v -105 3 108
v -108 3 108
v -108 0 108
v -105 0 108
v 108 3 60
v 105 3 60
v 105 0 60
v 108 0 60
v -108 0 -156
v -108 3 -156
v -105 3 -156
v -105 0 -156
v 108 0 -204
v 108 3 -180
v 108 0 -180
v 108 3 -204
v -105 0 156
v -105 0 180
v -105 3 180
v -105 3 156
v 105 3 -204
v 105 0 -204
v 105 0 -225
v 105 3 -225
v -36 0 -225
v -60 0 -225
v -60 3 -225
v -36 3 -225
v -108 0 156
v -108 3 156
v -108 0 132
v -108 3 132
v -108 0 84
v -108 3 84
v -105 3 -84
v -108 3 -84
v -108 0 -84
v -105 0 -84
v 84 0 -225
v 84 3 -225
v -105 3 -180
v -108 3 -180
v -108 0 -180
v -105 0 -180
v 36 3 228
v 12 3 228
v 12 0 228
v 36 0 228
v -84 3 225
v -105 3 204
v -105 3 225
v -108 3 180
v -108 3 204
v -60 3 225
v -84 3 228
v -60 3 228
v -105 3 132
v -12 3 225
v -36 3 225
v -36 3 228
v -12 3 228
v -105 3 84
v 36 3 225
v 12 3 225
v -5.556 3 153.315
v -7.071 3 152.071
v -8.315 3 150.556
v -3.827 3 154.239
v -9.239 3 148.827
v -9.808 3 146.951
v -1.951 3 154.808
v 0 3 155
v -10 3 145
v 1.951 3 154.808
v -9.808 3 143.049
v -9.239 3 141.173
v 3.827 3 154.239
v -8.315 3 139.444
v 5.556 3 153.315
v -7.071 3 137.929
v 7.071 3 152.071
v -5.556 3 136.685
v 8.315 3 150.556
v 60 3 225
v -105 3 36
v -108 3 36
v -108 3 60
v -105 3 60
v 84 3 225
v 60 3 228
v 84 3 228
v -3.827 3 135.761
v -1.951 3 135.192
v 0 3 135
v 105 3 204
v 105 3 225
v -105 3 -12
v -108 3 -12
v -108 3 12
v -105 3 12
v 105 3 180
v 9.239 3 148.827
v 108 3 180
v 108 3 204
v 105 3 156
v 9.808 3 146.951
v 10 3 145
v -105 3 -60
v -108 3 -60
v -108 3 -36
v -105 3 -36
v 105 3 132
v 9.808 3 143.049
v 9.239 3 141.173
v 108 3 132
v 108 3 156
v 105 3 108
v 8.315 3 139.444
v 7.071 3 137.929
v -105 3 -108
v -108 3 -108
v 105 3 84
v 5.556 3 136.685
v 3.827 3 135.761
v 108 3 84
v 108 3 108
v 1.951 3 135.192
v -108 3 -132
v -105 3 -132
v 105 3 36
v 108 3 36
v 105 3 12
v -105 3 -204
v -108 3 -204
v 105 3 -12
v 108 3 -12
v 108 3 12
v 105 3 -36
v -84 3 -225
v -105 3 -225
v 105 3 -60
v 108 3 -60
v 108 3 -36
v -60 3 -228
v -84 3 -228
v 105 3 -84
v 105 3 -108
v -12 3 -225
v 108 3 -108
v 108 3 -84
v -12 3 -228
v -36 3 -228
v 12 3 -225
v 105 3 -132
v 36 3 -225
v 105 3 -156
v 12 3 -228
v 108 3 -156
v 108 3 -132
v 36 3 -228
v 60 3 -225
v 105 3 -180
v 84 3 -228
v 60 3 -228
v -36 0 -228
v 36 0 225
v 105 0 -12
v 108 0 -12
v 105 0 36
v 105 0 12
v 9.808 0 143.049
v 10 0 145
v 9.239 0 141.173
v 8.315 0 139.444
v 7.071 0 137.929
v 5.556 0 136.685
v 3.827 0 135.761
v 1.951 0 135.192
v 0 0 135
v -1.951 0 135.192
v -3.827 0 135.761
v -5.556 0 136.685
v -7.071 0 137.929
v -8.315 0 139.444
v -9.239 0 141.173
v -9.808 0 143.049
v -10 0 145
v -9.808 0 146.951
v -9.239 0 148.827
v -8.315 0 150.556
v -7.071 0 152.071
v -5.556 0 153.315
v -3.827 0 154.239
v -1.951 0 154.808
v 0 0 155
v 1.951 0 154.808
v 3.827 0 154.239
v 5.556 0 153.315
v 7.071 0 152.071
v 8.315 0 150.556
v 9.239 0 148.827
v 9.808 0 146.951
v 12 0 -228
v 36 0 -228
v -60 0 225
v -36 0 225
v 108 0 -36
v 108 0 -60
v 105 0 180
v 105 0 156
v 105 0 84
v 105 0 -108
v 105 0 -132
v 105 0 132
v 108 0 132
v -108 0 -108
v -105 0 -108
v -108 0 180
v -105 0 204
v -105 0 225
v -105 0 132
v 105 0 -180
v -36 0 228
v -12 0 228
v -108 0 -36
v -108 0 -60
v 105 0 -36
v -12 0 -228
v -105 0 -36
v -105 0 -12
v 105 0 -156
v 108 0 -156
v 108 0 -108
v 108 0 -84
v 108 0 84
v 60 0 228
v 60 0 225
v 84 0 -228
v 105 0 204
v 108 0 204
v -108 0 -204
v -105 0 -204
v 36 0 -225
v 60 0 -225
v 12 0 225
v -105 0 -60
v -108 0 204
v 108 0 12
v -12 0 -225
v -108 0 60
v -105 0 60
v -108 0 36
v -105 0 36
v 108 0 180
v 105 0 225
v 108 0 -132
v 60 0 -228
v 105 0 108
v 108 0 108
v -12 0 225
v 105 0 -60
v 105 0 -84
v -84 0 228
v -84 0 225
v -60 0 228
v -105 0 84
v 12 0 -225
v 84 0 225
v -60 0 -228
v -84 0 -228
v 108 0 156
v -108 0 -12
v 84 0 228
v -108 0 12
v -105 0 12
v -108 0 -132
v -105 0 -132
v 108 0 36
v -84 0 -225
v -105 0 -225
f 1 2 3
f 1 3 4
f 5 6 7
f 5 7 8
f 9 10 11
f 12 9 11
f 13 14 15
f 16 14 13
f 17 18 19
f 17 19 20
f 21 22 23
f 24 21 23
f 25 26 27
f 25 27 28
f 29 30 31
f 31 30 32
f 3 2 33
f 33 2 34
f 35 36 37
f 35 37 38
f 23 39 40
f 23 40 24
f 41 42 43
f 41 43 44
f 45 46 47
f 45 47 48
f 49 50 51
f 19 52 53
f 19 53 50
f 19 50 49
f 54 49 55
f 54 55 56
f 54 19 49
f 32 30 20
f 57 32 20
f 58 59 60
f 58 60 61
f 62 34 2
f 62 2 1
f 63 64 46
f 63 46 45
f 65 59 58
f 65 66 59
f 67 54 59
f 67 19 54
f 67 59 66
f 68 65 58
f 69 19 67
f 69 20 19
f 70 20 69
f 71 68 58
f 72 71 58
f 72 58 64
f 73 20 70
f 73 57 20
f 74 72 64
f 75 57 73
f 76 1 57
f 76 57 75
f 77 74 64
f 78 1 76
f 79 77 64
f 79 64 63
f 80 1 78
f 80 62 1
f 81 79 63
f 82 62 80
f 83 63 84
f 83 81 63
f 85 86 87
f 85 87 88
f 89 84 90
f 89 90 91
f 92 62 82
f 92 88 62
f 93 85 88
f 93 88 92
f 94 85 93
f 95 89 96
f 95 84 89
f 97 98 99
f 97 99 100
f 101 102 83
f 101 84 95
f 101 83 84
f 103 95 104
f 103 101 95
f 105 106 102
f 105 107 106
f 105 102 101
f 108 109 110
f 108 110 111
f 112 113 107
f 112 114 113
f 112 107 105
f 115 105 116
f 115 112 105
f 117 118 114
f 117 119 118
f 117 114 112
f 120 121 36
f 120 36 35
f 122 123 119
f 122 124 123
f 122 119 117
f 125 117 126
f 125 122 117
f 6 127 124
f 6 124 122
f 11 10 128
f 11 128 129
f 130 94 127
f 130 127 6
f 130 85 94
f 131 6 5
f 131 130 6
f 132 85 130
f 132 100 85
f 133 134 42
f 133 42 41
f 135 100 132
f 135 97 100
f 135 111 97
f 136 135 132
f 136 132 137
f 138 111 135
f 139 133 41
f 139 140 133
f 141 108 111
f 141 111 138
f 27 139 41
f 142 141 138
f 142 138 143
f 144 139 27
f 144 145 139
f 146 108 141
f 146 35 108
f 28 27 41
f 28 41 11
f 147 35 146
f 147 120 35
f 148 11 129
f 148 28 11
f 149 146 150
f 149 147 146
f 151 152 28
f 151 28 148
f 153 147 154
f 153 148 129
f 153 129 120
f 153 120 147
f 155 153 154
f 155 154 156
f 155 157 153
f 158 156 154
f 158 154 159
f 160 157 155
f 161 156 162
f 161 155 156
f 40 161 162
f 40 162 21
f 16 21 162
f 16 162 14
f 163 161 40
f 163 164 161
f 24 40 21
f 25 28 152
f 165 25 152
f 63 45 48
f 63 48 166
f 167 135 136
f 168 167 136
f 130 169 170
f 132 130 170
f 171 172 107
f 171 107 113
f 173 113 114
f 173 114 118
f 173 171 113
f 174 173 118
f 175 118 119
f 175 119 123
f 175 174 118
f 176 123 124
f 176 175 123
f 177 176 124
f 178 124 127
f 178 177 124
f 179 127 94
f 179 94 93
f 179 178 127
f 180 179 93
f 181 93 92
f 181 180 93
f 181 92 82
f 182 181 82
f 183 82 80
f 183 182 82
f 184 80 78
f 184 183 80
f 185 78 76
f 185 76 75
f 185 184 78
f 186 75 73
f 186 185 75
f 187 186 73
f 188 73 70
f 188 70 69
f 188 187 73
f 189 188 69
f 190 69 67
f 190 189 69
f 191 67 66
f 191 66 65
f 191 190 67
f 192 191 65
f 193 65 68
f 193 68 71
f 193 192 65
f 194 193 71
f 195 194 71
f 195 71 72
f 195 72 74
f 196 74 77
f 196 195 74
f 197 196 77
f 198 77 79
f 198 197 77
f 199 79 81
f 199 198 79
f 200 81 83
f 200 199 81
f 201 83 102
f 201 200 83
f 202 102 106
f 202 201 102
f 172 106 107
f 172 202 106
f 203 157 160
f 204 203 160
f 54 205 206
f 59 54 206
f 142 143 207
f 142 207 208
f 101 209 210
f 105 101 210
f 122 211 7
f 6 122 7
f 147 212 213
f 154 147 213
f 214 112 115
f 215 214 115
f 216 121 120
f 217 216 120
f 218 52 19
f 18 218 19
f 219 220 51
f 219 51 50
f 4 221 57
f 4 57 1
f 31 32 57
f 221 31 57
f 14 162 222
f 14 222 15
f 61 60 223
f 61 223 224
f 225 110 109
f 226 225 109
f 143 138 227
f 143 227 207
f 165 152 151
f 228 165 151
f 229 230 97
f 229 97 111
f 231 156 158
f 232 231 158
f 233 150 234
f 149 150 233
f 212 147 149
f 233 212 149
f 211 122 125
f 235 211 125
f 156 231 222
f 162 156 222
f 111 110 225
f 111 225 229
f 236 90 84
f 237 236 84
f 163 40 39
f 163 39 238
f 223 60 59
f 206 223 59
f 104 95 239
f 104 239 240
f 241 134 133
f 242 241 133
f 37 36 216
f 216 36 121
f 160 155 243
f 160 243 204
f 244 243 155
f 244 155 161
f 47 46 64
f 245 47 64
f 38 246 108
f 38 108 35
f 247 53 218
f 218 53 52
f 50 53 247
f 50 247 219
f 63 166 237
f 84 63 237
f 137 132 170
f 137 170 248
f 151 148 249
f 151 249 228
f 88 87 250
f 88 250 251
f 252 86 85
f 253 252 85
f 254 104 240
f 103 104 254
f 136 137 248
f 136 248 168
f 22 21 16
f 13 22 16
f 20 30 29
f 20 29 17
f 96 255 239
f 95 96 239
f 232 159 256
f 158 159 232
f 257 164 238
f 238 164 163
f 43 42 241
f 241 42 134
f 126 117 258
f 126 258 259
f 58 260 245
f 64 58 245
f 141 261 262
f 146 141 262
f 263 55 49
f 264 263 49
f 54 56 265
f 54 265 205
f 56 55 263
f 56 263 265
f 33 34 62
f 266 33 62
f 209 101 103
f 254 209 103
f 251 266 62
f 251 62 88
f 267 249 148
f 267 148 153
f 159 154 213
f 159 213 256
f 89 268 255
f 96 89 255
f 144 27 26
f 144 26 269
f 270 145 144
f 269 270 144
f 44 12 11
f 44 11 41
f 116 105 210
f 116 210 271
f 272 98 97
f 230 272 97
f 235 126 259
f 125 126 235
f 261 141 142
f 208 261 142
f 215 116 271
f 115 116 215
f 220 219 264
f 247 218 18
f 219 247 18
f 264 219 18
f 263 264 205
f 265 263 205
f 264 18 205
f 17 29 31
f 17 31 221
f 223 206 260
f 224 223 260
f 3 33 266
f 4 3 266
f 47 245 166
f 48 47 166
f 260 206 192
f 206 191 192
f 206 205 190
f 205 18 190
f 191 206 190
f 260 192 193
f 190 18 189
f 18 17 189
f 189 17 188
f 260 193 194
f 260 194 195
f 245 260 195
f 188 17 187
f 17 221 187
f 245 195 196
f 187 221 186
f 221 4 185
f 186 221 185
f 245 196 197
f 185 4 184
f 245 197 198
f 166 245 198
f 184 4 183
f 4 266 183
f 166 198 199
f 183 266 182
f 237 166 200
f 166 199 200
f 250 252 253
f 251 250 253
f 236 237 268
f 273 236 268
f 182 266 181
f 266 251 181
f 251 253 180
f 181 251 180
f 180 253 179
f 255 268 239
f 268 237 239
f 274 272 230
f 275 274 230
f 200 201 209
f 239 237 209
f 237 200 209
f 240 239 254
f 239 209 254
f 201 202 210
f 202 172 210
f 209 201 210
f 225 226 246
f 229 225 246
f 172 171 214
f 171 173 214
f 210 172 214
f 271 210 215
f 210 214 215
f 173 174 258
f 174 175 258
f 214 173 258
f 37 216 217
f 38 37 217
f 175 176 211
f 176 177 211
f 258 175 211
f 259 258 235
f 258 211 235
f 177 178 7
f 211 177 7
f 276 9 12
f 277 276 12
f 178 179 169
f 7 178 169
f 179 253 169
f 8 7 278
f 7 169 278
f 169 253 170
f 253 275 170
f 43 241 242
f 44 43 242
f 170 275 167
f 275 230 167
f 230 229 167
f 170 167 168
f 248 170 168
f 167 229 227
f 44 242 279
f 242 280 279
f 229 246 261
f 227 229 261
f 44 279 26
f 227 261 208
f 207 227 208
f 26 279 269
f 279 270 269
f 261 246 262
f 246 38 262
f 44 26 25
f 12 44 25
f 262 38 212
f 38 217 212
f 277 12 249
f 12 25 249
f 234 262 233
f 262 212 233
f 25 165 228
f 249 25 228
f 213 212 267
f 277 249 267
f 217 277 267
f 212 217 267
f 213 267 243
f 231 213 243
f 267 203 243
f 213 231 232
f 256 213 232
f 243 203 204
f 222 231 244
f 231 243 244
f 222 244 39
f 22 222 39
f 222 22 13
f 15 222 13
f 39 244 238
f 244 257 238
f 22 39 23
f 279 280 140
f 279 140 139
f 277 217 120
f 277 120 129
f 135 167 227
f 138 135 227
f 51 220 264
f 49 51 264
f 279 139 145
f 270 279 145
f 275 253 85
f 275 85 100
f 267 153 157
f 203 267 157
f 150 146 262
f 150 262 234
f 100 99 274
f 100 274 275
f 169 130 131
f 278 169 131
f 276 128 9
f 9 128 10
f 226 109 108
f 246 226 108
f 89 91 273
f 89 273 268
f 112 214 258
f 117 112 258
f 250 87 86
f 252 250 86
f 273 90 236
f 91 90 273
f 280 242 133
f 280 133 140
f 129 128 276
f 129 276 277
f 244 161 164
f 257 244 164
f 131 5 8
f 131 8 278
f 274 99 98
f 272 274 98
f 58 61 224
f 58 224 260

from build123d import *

# Parameters (mm, degrees)
SKETCH1_W           = 210
SKETCH1_H           = 450
SKETCH1_R           = 10
BOSS_EXTRUDE1_DEPTH = 3
SKETCH3_W           = 3
SKETCH3_H           = 24
BOSS_EXTRUDE3_DEPTH = 3
SKETCH2_W           = 24
SKETCH2_H           = 3
BOSS_EXTRUDE4_DEPTH = 3


with BuildPart() as part:
    # Sketch1 → Boss-Extrude1 (new body)
    with BuildSketch(Plane(origin=(0, 0, 0), x_dir=(1, 0, 0), z_dir=(0, 1, 0))):
        Rectangle(SKETCH1_W, SKETCH1_H)
        with Locations((0, -145)):
            Circle(SKETCH1_R, mode=Mode.SUBTRACT)
    extrude(amount=BOSS_EXTRUDE1_DEPTH)

    # Sketch3 → Boss-Extrude3 (add)
    with BuildSketch(Plane(origin=(0, 3, 0), x_dir=(1, 0, 0), z_dir=(0, 1, 0))):
        with Locations((-106.5, 192)):
            Rectangle(SKETCH3_W, SKETCH3_H)
        with Locations((106.5, 192)):
            Rectangle(SKETCH3_W, SKETCH3_H)
        with Locations((106.5, 144)):
            Rectangle(SKETCH3_W, SKETCH3_H)
        with Locations((106.5, 96)):
            Rectangle(SKETCH3_W, SKETCH3_H)
        with Locations((106.5, 48)):
            Rectangle(SKETCH3_W, SKETCH3_H)
        with Locations((106.5, 0)):
            Rectangle(SKETCH3_W, SKETCH3_H)
        with Locations((106.5, -48)):
            Rectangle(SKETCH3_W, SKETCH3_H)
        with Locations((106.5, -96)):
            Rectangle(SKETCH3_W, SKETCH3_H)
        with Locations((106.5, -144)):
            Rectangle(SKETCH3_W, SKETCH3_H)
        with Locations((106.5, -192)):
            Rectangle(SKETCH3_W, SKETCH3_H)
        with Locations((-106.5, 144)):
            Rectangle(SKETCH3_W, SKETCH3_H)
        with Locations((-106.5, 96)):
            Rectangle(SKETCH3_W, SKETCH3_H)
        with Locations((-106.5, 48)):
            Rectangle(SKETCH3_W, SKETCH3_H)
        with Locations((-106.5, 0)):
            Rectangle(SKETCH3_W, SKETCH3_H)
        with Locations((-106.5, -48)):
            Rectangle(SKETCH3_W, SKETCH3_H)
        with Locations((-106.5, -96)):
            Rectangle(SKETCH3_W, SKETCH3_H)
        with Locations((-106.5, -144)):
            Rectangle(SKETCH3_W, SKETCH3_H)
        with Locations((-106.5, -192)):
            Rectangle(SKETCH3_W, SKETCH3_H)
    extrude(amount=-BOSS_EXTRUDE3_DEPTH)

    # Sketch2 → Boss-Extrude4 (add)
    with BuildSketch(Plane(origin=(0, 3, 0), x_dir=(1, 0, 0), z_dir=(0, 1, 0))):
        with Locations((-72, 226.5)):
            Rectangle(SKETCH2_W, SKETCH2_H)
        with Locations((-24, 226.5)):
            Rectangle(SKETCH2_W, SKETCH2_H)
        with Locations((24, 226.5)):
            Rectangle(SKETCH2_W, SKETCH2_H)
        with Locations((72, 226.5)):
            Rectangle(SKETCH2_W, SKETCH2_H)
        with Locations((-71.999992639, -226.5)):
            Rectangle(SKETCH2_W, SKETCH2_H)
        with Locations((-23.999992639, -226.5)):
            Rectangle(SKETCH2_W, SKETCH2_H)
        with Locations((24.000007361, -226.5)):
            Rectangle(SKETCH2_W, SKETCH2_H)
        with Locations((72.000007361, -226.5)):
            Rectangle(SKETCH2_W, SKETCH2_H)
    extrude(amount=-BOSS_EXTRUDE4_DEPTH)


solid = part.part
